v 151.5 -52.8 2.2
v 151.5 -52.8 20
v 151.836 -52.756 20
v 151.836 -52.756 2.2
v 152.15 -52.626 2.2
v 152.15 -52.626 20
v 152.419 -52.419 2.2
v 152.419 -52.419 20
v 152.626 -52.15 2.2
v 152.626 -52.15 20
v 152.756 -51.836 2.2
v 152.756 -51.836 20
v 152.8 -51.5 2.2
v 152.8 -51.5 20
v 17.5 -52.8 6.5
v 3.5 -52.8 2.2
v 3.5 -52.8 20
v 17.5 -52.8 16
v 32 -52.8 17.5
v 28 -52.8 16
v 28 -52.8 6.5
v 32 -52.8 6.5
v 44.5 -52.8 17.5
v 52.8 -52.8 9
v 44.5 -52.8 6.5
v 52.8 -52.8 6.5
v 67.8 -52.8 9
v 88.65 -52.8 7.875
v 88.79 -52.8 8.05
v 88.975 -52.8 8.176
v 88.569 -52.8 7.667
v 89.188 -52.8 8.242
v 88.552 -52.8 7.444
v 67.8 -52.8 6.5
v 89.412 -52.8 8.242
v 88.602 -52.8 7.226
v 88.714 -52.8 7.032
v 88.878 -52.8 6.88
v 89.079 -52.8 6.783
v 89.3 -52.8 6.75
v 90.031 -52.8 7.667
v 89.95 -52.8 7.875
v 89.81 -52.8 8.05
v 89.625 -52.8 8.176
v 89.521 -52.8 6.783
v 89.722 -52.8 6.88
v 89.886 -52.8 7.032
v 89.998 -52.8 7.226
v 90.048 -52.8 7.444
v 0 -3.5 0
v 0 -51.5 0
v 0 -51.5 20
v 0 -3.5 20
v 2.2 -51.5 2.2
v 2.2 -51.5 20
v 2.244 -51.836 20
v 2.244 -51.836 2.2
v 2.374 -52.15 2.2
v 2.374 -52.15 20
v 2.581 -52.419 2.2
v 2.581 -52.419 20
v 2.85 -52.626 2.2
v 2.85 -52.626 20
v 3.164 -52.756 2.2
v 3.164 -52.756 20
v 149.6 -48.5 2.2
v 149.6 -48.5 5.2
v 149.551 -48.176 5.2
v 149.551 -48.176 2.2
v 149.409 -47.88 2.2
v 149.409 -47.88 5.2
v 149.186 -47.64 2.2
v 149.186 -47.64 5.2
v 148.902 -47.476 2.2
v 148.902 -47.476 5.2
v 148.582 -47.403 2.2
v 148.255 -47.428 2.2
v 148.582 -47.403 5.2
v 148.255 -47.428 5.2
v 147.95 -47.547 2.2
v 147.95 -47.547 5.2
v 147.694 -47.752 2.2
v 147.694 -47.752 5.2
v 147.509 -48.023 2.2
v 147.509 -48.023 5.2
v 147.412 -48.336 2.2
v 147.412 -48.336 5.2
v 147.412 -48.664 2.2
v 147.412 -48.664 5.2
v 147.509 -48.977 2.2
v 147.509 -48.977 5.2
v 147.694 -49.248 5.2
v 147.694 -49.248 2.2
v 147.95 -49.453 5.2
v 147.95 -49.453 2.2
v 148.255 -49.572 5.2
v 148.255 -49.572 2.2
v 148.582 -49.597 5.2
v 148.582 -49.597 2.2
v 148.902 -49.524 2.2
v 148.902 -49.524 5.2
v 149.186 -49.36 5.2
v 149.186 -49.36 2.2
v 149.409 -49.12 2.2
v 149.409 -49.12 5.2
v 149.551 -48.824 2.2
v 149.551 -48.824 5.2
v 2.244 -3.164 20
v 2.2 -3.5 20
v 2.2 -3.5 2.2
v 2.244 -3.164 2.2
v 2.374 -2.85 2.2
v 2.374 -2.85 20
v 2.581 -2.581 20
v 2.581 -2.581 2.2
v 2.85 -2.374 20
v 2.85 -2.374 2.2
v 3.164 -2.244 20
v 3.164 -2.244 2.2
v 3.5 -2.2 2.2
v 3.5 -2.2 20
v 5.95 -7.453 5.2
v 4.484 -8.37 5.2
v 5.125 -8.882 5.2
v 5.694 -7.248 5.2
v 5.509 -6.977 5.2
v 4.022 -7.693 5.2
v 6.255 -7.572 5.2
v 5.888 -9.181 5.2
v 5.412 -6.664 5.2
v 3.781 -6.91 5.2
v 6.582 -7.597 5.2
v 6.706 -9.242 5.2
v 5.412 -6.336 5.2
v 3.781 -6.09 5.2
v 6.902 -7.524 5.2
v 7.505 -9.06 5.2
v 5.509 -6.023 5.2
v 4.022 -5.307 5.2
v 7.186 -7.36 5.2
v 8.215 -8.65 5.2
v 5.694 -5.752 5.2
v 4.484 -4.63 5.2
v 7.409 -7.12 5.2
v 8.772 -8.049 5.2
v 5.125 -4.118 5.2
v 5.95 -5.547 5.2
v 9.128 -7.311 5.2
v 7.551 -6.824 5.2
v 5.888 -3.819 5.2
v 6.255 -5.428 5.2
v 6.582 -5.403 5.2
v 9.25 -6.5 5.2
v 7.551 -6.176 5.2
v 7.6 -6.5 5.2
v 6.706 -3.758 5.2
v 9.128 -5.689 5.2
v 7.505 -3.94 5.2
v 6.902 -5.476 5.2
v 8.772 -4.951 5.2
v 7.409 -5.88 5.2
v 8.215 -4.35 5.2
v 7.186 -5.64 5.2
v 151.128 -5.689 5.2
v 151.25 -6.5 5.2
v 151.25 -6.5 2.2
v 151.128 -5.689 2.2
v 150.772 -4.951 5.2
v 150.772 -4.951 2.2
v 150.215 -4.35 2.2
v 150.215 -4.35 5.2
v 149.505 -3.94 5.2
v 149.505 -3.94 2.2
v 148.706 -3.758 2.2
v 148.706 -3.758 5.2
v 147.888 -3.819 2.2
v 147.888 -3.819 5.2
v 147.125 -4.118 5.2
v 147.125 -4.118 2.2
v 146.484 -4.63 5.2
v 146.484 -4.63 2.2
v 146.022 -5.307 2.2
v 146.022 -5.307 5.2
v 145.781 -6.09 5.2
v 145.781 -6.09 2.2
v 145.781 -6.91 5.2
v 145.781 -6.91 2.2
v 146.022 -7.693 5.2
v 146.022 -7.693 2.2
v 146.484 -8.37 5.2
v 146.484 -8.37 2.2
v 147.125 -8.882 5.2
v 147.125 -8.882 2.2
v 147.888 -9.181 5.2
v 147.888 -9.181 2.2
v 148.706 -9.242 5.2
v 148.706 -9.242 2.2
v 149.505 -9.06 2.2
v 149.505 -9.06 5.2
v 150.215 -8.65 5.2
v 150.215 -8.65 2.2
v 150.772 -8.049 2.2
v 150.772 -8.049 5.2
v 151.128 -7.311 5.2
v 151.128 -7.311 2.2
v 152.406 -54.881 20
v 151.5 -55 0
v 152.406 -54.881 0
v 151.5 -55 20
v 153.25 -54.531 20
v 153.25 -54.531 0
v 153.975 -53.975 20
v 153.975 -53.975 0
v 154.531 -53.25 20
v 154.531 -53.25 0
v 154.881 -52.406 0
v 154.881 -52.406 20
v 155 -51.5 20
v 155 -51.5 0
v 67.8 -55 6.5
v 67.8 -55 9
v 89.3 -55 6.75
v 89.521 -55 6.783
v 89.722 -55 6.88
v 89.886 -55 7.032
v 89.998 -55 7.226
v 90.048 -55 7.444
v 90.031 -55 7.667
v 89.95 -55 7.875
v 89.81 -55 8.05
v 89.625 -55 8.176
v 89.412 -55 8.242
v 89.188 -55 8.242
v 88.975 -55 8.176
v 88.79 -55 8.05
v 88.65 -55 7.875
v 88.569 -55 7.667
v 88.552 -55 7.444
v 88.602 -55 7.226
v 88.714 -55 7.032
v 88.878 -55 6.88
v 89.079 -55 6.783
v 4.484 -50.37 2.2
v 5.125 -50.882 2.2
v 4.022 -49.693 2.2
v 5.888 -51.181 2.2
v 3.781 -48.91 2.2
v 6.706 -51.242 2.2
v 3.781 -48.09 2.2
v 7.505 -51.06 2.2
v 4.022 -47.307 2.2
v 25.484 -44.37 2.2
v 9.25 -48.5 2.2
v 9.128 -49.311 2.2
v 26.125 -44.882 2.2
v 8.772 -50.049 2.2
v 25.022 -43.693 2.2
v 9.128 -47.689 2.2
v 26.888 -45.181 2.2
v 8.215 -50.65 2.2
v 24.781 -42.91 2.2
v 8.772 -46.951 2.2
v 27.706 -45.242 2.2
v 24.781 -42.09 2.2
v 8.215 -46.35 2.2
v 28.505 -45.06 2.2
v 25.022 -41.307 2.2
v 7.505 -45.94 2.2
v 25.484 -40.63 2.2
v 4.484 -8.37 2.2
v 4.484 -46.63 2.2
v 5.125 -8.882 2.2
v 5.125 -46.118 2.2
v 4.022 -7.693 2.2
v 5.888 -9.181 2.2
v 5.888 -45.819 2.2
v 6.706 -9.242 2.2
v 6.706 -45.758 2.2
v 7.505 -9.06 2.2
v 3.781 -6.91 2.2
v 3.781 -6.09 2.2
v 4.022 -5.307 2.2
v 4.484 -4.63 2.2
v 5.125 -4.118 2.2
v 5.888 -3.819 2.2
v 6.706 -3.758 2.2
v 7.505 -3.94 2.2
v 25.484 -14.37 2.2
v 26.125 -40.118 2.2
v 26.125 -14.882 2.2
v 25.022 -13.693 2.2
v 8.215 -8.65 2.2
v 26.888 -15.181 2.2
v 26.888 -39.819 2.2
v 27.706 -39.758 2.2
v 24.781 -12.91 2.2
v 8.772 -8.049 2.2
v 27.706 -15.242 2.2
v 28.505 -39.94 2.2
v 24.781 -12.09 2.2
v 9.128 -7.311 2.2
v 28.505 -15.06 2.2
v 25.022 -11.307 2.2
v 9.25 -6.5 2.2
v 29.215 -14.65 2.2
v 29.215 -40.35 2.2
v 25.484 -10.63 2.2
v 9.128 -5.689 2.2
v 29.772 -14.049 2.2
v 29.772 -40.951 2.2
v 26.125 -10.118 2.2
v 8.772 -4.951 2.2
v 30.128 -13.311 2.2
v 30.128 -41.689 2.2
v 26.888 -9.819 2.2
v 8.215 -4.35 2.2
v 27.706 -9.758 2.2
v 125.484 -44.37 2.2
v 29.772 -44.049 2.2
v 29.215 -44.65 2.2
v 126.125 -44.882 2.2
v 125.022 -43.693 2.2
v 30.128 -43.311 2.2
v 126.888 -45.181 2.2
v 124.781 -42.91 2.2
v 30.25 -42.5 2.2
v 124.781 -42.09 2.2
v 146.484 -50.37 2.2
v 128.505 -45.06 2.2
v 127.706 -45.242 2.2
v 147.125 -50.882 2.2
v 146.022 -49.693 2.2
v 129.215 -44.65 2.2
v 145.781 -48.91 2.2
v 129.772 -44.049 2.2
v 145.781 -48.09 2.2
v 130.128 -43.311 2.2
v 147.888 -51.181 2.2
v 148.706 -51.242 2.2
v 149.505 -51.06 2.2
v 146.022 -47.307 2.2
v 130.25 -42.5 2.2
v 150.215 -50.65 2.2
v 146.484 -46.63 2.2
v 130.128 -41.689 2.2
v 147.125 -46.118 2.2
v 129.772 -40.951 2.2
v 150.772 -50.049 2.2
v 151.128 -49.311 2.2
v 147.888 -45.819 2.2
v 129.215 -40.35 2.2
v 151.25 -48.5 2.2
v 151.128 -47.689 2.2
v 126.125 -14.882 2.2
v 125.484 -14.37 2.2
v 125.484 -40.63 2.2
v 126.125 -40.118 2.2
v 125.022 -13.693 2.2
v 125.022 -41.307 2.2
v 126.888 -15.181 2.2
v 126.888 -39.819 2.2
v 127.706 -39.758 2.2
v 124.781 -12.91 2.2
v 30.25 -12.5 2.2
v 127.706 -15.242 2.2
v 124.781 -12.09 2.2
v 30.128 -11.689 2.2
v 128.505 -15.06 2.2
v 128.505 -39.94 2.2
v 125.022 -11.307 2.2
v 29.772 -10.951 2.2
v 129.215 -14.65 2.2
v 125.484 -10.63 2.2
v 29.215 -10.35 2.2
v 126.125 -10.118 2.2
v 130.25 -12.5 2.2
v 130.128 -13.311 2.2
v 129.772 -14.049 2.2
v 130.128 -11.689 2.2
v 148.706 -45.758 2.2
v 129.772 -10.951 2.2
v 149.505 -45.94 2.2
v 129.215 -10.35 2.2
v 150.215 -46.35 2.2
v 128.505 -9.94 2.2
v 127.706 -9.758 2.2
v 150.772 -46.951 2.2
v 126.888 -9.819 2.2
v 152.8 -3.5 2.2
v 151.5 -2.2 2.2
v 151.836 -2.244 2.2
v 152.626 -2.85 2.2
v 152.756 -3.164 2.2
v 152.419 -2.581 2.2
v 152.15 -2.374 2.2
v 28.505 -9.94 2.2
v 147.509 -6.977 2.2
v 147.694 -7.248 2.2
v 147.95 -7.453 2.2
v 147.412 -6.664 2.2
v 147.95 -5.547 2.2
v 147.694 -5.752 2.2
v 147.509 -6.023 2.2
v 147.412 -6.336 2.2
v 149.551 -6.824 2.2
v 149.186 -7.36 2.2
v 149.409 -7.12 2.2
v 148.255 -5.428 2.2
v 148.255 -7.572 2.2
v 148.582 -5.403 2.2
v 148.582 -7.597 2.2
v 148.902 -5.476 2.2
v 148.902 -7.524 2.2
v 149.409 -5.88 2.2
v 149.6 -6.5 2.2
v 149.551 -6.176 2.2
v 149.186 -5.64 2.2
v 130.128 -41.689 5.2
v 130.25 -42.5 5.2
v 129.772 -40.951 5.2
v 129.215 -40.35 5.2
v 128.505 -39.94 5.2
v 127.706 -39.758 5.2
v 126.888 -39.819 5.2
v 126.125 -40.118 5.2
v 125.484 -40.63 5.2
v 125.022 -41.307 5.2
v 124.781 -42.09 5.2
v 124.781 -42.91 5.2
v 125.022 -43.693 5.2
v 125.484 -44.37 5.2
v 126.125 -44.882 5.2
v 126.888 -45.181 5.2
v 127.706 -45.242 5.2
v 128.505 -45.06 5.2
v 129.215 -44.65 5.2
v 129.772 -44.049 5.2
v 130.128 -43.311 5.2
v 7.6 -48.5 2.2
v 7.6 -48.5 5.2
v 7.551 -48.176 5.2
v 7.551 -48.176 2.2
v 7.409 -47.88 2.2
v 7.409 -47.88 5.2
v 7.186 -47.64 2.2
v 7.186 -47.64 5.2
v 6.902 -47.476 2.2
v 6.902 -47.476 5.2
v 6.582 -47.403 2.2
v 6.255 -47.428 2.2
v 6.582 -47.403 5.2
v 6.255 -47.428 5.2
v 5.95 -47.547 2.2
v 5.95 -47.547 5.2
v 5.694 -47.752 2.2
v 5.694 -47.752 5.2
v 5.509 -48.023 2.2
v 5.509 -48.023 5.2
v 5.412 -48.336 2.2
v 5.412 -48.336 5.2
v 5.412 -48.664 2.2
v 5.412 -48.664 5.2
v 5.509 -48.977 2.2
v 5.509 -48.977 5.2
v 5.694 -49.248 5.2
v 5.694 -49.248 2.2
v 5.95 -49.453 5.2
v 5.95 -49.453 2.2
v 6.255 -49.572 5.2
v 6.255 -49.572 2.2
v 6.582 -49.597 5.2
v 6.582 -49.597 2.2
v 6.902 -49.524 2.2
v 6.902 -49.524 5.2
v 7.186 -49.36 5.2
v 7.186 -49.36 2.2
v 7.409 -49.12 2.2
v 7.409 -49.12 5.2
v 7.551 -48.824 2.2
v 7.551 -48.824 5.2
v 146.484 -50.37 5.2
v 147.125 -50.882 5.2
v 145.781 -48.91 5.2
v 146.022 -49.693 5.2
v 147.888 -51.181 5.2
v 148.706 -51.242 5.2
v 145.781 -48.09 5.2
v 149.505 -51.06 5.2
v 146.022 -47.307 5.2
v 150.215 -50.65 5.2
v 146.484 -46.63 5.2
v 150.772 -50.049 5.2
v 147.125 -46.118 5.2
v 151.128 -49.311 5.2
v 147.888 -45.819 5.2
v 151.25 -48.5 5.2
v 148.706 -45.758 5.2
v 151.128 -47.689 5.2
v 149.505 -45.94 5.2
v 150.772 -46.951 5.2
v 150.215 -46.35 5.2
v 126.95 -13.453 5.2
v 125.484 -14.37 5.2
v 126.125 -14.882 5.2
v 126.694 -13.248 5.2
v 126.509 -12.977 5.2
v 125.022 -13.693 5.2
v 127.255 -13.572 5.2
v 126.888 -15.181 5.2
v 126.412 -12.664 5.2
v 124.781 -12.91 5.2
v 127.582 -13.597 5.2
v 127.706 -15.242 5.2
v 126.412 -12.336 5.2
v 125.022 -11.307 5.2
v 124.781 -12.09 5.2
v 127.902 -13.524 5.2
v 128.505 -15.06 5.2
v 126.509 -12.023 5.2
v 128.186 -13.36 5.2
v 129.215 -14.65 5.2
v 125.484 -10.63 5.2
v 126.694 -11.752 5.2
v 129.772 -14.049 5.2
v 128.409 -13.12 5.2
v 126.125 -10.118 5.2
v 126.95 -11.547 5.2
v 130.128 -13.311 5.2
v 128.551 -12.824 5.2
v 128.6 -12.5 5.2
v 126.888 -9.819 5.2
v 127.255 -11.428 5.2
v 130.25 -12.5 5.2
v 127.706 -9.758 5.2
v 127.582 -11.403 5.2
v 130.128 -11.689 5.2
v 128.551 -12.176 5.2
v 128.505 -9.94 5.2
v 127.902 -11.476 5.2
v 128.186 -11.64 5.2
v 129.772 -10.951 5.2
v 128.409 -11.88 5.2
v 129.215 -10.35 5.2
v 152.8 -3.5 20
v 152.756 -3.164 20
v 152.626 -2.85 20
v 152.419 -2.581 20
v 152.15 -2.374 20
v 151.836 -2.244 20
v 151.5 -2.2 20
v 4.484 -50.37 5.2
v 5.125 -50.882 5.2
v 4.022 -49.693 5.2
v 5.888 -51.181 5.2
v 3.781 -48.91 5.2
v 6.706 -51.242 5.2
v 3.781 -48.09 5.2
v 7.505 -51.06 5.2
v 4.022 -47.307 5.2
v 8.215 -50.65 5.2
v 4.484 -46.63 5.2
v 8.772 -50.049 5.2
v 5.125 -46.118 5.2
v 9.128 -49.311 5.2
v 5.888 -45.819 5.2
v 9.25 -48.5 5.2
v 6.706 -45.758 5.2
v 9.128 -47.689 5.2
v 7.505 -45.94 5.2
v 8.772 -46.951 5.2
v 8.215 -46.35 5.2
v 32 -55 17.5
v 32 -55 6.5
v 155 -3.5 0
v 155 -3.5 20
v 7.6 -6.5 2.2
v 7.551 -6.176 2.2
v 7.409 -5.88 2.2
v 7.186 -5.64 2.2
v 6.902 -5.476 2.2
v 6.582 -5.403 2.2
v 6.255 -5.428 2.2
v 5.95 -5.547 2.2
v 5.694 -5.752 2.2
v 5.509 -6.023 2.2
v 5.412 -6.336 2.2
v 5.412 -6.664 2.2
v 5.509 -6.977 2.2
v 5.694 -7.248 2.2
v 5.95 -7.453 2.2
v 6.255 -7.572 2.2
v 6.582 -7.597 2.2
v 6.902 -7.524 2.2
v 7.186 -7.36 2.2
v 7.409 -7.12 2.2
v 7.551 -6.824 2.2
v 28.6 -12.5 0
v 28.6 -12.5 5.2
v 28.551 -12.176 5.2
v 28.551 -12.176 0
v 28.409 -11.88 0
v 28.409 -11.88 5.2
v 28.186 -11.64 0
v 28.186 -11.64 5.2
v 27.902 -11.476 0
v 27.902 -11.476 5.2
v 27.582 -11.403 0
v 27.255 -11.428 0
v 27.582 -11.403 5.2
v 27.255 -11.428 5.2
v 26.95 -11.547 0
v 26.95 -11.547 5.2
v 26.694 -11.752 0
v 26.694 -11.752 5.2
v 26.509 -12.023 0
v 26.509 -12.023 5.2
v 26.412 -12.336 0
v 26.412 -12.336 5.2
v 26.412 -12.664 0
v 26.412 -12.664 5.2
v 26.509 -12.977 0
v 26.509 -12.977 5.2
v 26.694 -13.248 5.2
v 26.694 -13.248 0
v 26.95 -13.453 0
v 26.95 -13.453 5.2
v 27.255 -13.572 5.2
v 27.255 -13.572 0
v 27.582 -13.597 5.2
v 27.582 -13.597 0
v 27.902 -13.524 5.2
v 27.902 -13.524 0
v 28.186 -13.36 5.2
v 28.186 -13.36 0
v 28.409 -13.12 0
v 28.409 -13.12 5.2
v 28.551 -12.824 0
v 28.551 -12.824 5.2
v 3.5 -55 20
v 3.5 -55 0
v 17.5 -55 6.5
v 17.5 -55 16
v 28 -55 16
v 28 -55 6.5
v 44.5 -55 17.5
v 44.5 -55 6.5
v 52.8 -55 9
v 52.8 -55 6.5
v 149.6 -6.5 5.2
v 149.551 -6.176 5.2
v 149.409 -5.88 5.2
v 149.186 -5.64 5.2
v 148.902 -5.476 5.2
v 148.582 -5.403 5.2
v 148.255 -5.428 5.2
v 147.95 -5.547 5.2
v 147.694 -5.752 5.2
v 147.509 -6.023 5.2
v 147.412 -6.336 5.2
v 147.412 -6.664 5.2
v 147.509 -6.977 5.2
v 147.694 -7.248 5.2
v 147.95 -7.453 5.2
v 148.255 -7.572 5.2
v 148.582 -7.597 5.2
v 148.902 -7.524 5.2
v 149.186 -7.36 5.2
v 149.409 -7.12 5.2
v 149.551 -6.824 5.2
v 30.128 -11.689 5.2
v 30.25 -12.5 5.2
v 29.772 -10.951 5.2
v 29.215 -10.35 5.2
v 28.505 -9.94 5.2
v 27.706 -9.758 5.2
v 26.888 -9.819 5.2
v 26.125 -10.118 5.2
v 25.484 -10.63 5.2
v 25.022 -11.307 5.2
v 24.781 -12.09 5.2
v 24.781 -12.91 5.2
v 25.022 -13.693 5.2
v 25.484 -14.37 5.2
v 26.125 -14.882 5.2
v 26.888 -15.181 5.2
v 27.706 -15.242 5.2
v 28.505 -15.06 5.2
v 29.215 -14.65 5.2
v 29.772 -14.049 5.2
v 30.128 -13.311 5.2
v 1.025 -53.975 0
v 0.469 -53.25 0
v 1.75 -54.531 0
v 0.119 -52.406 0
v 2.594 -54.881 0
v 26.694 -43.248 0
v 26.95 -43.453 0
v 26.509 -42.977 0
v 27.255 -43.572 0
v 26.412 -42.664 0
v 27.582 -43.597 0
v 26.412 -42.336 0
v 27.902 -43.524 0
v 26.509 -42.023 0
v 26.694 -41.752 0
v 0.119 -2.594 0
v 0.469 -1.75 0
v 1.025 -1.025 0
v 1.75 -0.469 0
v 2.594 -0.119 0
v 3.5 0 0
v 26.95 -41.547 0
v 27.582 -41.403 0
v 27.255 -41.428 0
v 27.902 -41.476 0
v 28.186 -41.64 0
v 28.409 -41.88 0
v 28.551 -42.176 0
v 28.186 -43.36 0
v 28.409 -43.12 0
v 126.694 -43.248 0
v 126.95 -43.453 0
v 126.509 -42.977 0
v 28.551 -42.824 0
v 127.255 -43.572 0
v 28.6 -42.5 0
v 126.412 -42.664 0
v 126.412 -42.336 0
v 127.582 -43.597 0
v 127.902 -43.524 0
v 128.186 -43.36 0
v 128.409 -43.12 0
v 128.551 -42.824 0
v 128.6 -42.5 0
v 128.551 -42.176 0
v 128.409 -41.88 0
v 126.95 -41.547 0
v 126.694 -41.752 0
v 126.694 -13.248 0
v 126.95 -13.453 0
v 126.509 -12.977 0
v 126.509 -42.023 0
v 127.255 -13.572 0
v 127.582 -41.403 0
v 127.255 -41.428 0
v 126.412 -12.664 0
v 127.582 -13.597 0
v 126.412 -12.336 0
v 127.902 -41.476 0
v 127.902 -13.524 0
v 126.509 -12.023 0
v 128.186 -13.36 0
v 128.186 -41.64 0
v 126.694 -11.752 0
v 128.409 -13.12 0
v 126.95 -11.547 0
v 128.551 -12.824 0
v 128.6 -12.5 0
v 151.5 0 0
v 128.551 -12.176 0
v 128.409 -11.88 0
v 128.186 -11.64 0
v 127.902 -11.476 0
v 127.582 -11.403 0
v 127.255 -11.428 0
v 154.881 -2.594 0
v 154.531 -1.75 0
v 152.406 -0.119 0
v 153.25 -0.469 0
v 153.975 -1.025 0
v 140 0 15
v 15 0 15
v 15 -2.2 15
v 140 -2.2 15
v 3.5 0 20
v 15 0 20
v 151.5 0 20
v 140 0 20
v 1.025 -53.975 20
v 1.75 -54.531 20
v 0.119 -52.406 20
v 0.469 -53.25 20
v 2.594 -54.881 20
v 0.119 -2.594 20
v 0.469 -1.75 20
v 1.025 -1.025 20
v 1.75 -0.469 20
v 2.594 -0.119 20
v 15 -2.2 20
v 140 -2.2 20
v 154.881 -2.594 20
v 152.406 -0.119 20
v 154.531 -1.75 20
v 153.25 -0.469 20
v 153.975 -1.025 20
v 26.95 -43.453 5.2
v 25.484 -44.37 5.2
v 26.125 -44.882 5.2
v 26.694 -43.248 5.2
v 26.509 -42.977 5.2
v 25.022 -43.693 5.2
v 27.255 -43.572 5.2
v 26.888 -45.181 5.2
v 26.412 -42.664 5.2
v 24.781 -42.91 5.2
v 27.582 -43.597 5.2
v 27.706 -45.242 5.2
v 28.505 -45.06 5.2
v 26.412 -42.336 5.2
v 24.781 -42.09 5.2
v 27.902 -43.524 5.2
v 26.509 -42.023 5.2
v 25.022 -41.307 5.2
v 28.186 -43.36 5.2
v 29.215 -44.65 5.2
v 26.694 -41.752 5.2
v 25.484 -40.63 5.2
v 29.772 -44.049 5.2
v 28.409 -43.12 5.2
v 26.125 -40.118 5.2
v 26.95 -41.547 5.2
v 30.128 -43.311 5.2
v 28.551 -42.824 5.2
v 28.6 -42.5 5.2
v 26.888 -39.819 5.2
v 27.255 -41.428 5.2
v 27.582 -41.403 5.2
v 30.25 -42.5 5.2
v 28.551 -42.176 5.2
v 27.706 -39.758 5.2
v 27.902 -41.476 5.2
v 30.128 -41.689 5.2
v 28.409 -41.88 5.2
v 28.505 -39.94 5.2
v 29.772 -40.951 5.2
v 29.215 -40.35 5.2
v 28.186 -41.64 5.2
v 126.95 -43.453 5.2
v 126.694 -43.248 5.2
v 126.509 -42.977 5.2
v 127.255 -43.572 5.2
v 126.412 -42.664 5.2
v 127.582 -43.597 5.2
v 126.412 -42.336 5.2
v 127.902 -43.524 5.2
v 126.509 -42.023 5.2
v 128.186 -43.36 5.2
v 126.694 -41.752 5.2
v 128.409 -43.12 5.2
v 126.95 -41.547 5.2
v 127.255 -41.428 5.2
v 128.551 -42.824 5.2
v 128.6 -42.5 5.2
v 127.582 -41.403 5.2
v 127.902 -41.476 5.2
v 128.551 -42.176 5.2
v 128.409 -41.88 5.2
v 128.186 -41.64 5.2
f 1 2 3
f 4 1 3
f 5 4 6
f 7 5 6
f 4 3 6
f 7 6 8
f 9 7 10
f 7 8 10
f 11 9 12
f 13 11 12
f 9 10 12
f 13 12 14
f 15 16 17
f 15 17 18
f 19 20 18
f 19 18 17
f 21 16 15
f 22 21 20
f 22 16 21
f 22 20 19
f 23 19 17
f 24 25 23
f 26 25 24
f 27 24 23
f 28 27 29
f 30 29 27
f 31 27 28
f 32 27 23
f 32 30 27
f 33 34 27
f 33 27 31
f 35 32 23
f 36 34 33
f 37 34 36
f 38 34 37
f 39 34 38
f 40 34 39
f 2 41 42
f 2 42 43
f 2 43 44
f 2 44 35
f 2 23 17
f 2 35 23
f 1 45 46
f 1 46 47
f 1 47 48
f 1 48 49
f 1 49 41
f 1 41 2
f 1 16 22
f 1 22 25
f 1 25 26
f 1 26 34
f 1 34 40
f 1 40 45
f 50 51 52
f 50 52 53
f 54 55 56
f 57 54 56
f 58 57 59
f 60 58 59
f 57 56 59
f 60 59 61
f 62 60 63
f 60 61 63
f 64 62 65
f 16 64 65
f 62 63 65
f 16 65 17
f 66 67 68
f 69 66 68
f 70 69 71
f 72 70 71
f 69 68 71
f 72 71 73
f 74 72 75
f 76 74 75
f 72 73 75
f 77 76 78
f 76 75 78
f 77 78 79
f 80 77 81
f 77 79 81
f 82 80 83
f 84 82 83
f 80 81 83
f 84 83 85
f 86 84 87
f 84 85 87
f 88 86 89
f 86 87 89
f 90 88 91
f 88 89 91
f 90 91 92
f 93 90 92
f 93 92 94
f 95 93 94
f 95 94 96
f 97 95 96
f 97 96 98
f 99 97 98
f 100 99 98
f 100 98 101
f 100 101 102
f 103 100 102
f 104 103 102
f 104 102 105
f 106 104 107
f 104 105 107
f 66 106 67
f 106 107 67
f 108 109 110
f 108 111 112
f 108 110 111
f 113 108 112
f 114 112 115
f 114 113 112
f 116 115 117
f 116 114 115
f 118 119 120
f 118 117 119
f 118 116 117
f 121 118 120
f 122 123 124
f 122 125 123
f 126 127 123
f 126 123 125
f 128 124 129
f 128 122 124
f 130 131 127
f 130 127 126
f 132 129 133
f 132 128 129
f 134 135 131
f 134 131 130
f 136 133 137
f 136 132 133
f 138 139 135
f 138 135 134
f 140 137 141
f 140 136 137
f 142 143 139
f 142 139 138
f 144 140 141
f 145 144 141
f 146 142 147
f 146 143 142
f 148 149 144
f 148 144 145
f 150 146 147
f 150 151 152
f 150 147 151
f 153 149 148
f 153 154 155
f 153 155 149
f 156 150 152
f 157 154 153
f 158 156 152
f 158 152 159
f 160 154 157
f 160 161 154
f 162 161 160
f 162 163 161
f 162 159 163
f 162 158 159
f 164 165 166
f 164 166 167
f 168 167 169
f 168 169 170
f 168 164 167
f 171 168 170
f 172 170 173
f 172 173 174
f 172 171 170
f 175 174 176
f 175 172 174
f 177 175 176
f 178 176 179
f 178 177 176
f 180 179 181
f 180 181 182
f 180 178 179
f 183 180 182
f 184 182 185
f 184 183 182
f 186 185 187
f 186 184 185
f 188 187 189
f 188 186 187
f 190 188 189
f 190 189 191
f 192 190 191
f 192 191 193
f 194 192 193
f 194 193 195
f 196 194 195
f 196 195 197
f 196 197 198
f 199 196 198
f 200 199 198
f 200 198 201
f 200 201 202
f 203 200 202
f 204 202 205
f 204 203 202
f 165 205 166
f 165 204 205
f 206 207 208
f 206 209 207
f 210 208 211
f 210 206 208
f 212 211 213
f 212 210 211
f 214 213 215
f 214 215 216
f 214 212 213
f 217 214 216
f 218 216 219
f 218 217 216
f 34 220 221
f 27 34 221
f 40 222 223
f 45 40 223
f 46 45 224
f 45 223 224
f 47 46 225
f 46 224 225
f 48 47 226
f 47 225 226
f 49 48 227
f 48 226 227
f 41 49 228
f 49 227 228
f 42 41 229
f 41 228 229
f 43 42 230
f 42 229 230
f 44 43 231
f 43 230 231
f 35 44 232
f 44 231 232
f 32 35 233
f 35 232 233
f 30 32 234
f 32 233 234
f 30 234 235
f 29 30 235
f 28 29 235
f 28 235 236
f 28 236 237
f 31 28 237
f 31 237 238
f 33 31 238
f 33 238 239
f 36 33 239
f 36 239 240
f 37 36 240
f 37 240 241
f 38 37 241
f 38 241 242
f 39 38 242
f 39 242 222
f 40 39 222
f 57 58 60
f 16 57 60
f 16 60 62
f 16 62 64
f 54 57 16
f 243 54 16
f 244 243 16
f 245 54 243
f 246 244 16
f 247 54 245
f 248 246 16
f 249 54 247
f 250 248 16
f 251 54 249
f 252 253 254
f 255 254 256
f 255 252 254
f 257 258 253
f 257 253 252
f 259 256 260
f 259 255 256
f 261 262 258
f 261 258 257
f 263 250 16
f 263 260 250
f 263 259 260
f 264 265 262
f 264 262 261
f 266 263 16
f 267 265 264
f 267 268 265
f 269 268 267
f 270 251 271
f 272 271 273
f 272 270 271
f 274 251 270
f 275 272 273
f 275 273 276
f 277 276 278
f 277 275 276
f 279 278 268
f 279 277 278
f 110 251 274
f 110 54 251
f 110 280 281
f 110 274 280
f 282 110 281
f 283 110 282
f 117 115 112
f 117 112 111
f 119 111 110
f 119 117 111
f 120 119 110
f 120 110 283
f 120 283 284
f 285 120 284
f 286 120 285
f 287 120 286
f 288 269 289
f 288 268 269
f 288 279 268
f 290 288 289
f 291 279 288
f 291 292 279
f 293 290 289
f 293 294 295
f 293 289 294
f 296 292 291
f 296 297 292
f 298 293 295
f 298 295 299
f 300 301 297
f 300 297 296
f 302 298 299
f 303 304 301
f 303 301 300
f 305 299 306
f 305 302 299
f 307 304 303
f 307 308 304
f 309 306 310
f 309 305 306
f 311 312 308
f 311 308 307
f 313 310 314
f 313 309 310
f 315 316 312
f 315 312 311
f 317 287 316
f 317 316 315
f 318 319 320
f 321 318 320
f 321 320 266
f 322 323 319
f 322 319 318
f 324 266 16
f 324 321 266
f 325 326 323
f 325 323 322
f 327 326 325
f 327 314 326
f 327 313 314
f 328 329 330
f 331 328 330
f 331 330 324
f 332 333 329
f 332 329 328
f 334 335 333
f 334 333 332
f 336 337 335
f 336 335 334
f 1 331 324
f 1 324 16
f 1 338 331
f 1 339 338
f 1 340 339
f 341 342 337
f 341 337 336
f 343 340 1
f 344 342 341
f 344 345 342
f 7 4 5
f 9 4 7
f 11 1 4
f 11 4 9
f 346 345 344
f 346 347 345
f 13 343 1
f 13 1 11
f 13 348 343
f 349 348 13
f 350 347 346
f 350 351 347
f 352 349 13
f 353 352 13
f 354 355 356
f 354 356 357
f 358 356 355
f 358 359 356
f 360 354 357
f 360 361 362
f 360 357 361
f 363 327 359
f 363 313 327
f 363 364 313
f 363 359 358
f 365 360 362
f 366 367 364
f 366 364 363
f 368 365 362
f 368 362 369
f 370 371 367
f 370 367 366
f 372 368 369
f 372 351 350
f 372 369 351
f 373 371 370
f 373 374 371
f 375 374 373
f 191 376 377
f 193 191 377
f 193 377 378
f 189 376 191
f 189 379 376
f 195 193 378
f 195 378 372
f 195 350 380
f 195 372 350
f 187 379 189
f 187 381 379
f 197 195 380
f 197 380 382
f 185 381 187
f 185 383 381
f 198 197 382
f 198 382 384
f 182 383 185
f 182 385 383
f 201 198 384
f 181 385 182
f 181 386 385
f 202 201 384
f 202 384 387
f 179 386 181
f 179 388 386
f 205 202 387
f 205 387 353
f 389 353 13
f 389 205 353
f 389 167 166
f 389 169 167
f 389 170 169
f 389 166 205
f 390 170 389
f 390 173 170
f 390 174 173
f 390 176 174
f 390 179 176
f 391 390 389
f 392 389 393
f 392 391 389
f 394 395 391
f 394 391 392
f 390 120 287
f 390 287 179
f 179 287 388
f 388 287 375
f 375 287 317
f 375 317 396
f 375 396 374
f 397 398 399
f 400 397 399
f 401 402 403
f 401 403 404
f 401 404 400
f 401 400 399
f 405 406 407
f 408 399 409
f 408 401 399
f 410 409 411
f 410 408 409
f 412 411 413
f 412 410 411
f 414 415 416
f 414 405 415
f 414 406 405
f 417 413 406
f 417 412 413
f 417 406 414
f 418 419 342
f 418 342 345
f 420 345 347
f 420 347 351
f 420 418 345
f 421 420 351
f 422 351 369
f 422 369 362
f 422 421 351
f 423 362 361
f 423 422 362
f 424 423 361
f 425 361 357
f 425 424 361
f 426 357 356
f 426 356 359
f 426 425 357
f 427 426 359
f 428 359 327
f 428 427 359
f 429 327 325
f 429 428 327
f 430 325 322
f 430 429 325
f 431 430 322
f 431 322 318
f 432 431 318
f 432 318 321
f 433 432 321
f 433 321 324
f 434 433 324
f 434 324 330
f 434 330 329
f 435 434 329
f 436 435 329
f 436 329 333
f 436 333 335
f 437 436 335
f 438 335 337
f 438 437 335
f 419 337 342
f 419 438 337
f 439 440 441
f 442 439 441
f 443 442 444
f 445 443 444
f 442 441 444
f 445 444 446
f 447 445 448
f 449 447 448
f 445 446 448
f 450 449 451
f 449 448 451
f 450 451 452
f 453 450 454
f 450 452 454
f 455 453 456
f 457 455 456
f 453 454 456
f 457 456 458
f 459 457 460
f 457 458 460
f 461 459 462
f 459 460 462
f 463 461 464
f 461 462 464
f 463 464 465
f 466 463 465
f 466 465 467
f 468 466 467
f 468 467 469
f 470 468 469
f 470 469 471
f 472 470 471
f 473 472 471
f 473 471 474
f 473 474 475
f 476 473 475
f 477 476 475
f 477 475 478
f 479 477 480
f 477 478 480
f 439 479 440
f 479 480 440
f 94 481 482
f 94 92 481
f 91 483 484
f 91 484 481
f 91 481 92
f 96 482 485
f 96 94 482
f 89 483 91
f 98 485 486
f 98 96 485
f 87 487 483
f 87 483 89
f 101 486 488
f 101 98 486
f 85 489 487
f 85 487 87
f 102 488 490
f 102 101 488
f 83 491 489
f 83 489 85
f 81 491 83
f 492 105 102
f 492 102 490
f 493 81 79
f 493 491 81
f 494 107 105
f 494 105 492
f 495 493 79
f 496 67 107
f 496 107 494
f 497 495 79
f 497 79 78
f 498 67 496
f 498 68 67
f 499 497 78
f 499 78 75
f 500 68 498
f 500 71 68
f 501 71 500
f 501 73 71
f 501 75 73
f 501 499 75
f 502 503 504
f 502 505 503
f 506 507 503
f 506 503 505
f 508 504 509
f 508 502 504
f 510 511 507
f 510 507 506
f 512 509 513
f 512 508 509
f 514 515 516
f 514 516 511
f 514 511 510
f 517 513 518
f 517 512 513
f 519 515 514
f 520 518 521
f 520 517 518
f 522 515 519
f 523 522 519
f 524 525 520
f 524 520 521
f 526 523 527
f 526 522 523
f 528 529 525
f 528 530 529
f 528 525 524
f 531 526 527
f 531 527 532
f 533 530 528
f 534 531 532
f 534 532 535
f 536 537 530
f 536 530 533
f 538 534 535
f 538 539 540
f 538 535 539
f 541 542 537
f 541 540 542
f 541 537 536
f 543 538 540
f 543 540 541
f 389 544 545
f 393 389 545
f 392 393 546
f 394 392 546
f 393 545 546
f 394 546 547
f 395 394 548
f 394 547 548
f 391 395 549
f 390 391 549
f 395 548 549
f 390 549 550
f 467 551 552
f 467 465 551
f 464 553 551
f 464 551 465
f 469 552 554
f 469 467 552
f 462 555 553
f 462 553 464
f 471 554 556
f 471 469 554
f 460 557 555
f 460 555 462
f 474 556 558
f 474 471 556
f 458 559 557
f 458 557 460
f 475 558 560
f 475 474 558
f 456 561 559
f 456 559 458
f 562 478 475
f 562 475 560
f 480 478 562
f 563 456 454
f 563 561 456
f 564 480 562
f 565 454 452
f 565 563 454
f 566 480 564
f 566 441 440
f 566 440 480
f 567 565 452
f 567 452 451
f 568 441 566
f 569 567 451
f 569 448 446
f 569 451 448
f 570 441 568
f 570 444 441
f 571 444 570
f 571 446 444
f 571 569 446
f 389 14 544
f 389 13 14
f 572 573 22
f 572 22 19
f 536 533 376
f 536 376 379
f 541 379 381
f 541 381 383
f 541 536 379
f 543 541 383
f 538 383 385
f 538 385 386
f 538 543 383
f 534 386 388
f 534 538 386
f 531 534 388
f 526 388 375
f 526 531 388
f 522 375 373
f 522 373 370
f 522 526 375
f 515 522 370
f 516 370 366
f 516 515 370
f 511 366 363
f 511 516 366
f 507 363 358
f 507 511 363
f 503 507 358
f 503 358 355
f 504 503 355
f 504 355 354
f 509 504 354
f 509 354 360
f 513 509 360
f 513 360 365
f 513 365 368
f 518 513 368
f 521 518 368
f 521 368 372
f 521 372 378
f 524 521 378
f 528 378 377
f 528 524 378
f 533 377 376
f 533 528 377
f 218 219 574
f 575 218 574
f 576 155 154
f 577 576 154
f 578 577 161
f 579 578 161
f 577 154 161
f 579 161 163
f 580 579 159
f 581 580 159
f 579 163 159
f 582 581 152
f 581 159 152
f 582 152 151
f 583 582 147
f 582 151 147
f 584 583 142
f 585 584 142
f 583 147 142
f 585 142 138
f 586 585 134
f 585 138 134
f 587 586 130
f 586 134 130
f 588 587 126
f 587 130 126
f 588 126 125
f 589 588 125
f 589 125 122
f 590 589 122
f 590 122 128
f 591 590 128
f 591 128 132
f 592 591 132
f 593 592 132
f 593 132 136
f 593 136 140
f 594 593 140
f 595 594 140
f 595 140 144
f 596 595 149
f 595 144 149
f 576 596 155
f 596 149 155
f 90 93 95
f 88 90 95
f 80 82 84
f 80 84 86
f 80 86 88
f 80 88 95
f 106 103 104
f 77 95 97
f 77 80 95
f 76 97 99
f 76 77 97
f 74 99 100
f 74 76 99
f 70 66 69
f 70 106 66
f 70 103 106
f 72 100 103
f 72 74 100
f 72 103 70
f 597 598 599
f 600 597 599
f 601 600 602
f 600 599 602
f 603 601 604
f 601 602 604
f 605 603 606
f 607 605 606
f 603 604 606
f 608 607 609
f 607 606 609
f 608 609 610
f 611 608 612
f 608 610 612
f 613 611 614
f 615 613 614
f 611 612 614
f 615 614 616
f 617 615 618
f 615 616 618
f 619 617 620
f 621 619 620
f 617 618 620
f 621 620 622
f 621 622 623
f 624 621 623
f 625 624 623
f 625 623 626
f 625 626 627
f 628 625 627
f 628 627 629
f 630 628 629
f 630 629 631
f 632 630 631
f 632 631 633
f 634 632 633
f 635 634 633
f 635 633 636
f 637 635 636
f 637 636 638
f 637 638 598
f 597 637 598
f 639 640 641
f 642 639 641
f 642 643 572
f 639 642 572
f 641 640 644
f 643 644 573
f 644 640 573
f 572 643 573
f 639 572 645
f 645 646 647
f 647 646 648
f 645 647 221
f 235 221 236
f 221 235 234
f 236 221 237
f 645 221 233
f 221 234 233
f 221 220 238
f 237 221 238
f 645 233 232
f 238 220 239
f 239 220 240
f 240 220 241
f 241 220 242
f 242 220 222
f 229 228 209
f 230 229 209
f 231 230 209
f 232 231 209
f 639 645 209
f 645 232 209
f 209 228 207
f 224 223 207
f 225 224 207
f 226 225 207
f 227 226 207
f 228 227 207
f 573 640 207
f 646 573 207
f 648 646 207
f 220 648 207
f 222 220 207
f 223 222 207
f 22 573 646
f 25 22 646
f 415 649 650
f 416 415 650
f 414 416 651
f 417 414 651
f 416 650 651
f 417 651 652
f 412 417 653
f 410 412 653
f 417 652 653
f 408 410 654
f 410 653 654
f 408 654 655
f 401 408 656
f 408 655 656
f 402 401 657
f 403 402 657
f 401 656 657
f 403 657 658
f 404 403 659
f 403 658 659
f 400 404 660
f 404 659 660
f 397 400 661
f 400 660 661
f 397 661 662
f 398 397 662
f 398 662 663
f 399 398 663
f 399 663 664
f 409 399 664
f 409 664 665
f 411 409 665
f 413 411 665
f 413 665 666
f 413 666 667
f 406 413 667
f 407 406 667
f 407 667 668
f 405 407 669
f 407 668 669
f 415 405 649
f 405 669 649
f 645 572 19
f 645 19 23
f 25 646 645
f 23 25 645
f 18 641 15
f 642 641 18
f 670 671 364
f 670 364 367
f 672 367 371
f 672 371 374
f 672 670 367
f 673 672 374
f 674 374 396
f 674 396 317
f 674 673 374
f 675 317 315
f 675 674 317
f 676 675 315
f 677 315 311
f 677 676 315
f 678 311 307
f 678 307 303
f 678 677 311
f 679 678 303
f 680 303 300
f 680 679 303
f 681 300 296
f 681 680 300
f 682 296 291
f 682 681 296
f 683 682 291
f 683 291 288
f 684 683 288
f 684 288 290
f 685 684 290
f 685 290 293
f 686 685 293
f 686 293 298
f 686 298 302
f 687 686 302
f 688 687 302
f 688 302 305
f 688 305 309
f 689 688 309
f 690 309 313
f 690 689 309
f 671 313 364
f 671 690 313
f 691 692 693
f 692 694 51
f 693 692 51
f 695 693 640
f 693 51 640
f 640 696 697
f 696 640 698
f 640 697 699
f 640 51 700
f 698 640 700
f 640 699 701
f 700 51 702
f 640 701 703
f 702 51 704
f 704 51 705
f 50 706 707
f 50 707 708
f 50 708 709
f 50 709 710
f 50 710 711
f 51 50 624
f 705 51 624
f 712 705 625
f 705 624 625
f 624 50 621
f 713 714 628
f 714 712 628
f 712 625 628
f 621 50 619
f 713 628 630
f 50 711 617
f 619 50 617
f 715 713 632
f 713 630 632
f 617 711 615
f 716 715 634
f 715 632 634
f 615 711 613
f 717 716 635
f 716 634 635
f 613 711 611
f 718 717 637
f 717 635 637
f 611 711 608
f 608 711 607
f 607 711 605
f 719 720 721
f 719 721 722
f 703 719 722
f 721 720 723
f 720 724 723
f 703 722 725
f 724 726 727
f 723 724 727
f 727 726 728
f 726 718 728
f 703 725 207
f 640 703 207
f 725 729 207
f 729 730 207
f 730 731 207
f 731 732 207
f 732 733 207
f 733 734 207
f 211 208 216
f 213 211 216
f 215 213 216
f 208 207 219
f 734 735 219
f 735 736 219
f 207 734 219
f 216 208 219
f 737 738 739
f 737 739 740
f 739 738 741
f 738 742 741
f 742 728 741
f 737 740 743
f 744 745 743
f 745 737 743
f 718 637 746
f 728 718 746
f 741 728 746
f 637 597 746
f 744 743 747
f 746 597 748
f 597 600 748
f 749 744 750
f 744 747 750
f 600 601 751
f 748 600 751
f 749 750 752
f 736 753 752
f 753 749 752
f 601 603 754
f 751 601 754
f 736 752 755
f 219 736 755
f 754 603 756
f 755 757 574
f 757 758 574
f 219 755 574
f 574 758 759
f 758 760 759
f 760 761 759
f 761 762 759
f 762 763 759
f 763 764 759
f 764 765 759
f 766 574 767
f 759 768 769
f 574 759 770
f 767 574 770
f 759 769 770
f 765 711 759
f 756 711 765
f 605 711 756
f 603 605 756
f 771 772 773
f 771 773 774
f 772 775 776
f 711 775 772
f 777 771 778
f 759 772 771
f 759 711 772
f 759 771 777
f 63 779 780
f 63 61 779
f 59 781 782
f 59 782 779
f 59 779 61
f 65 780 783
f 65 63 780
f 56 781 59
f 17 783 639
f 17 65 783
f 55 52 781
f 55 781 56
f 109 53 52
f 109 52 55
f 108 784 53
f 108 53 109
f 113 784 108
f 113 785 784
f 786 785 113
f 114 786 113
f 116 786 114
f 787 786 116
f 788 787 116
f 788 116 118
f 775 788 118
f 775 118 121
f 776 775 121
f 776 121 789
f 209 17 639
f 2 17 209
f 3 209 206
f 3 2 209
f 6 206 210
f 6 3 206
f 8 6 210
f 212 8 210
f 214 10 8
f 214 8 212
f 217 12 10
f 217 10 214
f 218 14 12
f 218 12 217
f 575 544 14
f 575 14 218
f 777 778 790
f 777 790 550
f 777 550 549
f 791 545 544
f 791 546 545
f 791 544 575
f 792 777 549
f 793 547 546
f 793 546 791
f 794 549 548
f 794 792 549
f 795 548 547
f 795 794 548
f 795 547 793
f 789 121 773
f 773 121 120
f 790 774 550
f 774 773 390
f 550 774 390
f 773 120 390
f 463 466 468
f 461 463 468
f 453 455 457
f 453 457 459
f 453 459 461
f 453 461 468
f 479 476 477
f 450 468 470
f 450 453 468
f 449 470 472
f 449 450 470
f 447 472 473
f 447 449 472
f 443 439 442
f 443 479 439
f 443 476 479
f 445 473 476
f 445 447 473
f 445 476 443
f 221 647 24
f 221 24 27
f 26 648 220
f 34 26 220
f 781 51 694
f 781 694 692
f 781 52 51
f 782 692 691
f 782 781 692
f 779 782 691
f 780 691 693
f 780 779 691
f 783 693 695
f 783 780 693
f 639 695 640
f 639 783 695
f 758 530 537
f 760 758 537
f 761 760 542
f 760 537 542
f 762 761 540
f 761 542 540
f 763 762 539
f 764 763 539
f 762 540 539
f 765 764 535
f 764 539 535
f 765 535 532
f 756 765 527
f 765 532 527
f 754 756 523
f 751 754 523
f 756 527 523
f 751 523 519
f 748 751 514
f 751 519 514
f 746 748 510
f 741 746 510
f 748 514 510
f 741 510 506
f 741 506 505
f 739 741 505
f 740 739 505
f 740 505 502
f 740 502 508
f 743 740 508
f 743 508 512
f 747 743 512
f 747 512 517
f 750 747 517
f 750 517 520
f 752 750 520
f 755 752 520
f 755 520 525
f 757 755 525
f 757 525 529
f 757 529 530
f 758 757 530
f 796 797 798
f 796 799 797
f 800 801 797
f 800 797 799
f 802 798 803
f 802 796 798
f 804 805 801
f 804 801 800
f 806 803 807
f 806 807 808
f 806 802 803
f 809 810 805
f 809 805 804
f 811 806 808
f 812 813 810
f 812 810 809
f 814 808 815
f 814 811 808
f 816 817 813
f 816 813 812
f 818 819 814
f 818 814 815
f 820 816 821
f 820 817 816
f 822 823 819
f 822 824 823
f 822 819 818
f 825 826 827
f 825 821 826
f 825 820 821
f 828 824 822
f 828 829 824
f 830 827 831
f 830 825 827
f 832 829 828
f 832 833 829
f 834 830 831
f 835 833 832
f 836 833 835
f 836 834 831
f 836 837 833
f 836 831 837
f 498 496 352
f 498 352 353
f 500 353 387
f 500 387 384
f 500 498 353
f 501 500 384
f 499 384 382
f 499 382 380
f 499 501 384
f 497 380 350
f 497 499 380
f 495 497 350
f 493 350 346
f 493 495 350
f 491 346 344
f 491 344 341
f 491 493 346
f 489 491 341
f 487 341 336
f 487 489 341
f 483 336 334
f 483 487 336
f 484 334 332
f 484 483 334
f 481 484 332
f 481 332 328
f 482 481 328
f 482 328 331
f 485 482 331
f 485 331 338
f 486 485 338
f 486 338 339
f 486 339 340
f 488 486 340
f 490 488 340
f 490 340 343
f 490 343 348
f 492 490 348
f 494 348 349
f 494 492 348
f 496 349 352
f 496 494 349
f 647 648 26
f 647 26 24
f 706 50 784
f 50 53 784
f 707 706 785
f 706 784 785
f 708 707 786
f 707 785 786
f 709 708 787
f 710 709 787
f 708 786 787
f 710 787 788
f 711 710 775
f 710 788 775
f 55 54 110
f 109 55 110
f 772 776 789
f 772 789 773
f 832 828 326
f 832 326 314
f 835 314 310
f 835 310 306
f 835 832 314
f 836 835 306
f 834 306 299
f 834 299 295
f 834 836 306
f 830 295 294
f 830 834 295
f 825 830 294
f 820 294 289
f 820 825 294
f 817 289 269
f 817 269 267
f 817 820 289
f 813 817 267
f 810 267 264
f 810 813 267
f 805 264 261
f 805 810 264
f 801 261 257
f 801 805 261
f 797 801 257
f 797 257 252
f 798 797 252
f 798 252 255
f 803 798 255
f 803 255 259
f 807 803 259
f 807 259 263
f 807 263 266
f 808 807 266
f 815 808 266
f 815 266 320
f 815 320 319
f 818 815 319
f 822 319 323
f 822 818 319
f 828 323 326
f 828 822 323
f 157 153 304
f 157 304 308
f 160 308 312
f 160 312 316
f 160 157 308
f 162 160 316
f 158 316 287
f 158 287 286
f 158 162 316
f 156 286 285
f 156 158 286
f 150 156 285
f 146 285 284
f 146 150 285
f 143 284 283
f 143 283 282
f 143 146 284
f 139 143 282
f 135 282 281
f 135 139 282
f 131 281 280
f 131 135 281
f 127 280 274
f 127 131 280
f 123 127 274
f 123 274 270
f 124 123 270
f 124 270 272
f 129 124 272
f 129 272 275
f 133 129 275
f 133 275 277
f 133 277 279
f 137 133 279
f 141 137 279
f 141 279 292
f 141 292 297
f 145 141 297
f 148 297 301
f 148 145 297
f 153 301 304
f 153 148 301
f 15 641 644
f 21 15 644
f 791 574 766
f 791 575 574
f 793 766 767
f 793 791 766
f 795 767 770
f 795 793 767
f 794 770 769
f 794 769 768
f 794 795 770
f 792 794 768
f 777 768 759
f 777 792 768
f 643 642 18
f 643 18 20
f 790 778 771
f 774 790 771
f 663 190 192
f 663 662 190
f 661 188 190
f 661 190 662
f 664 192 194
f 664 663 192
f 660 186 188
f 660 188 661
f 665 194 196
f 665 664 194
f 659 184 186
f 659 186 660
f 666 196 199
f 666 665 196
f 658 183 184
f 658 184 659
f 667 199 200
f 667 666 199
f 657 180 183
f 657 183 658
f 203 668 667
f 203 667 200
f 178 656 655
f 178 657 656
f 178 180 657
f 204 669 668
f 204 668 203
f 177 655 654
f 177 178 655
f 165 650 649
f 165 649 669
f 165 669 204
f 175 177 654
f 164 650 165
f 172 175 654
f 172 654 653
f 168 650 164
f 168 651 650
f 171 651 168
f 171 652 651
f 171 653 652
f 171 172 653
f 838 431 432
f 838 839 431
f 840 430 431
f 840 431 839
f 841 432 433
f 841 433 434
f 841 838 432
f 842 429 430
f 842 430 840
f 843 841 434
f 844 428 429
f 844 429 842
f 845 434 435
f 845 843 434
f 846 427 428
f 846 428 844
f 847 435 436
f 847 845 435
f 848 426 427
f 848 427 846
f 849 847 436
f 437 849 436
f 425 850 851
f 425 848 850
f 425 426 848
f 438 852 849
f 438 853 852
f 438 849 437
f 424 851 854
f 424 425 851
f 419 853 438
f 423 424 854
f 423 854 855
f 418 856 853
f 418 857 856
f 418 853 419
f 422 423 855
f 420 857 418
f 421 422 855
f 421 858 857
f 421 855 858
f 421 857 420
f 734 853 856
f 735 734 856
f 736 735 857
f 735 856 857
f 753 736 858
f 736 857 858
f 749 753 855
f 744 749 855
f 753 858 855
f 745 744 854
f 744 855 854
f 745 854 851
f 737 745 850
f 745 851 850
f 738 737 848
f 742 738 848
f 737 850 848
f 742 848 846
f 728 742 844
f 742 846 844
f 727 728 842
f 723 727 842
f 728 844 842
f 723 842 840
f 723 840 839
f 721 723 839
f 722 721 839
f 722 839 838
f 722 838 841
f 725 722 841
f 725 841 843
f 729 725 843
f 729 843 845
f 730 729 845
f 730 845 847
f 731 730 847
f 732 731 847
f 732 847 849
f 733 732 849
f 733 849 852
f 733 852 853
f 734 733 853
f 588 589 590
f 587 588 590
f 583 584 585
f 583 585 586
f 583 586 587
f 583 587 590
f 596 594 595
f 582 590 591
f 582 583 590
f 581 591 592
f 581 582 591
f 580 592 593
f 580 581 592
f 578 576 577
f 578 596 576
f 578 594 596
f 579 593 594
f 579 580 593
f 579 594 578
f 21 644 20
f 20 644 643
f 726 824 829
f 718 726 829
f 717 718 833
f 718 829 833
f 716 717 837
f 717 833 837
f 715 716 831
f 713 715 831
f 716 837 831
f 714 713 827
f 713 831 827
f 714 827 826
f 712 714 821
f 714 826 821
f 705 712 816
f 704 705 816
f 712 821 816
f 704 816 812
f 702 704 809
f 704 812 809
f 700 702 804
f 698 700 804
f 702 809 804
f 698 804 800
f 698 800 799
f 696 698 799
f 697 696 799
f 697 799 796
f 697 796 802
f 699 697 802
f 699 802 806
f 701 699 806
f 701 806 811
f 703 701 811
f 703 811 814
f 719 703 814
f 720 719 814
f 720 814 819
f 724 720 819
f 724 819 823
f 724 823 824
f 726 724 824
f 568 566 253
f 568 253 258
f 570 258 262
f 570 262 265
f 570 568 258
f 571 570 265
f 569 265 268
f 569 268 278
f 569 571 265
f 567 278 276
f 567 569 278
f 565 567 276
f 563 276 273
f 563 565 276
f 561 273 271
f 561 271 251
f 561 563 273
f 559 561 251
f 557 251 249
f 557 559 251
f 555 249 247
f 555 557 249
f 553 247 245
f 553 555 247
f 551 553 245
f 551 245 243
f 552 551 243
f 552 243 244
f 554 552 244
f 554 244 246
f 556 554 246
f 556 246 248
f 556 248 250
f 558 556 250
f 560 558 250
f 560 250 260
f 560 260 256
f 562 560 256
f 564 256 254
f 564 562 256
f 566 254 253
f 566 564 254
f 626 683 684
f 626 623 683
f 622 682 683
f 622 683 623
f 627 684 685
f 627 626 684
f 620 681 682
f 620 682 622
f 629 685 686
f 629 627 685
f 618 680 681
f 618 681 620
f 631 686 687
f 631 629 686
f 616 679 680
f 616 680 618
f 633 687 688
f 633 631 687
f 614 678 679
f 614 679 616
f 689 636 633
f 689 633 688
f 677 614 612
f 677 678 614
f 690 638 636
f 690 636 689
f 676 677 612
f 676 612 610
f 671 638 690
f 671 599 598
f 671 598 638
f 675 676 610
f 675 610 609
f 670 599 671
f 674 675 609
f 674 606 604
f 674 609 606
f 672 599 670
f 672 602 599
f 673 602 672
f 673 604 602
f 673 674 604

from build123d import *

# Parameters (mm, degrees)
SKETCH_1_W          = 155
SKETCH_1_H          = 55
EXTRUDE_1_DEPTH     = 20
FILLET_1_R          = 3.5
SHELL_1_T           = -2.2
SKETCH_2_R          = 1.1
CUT_EXTRUDE_1_DEPTH = 10
EXTRUDE_START       = 3
SKETCH_3_R          = 2.75
SKETCH_3_R_2        = 1.1
EXTRUDE_2_DEPTH     = 3
SKETCH_4_R          = 0.75
SKETCH_4_W          = 10.5
SKETCH_4_H          = 9.5
SKETCH_4_W_2        = 12.5
SKETCH_4_H_2        = 11
SKETCH_4_W_3        = 15
SKETCH_4_H_3        = 2.5
CUT_EXTRUDE_2_DEPTH = 3
SKETCH_5_W          = 125
SKETCH_5_H          = 5
CUT_EXTRUDE_3_DEPTH = 3


with BuildPart() as part:
    # 草图1 → 凸台-拉伸1 (new body)
    with BuildSketch(Plane.XY):
        with Locations((77.5, -27.5)):
            Rectangle(SKETCH_1_W, SKETCH_1_H)
    extrude(amount=EXTRUDE_1_DEPTH)

    # 圆角1
    fillet_1_edges = [part.edges().sort_by_distance(p)[0] for p in [
        (0, 0, 10),
        (155, 0, 10),
        (155, -55, 10),
        (0, -55, 10),
    ]]
    fillet(fillet_1_edges, radius=FILLET_1_R)

    # 抽壳1
    shell_1_openings = [part.faces().sort_by_distance(p)[0] for p in [
        (77.5, -27.5, 20),
    ]]
    offset(amount=SHELL_1_T, openings=shell_1_openings, kind=Kind.INTERSECTION)

    # 草图2 → 切除-拉伸1 (cut)
    with BuildSketch(Plane.XY.offset(2.2)):
        with Locations((27.5, -12.5)):
            Circle(SKETCH_2_R)
        with Locations((127.5, -12.5)):
            Circle(SKETCH_2_R)
        with Locations((127.5, -42.5)):
            Circle(SKETCH_2_R)
        with Locations((27.5, -42.5)):
            Circle(SKETCH_2_R)
    extrude(amount=-CUT_EXTRUDE_1_DEPTH, mode=Mode.SUBTRACT)

    # 草图3 → 凸台-拉伸2 (add)
    # profile 1 of 8: a face of its own
    with BuildSketch(Plane.XY.offset(2.2).offset(EXTRUDE_START)):
        with Locations((27.5, -12.5)):
            Circle(SKETCH_3_R)
        with Locations((27.5, -12.5)):
            Circle(SKETCH_3_R_2, mode=Mode.SUBTRACT)
    # profile 2 of 8: a face of its own
    with BuildSketch(Plane.XY.offset(2.2).offset(EXTRUDE_START)):
        with Locations((127.5, -12.5)):
            Circle(SKETCH_3_R)
        with Locations((127.5, -12.5)):
            Circle(SKETCH_3_R_2, mode=Mode.SUBTRACT)
    # profile 3 of 8: a face of its own
    with BuildSketch(Plane.XY.offset(2.2).offset(EXTRUDE_START)):
        with Locations((127.5, -42.5)):
            Circle(SKETCH_3_R)
        with Locations((127.5, -42.5)):
            Circle(SKETCH_3_R_2, mode=Mode.SUBTRACT)
    # profile 4 of 8: a face of its own
    with BuildSketch(Plane.XY.offset(2.2).offset(EXTRUDE_START)):
        with Locations((27.5, -42.5)):
            Circle(SKETCH_3_R)
        with Locations((27.5, -42.5)):
            Circle(SKETCH_3_R_2, mode=Mode.SUBTRACT)
    # profile 5 of 8: a face of its own
    with BuildSketch(Plane.XY.offset(2.2).offset(EXTRUDE_START)):
        with Locations((6.5, -6.5)):
            Circle(SKETCH_3_R)
        with Locations((6.5, -6.5)):
            Circle(SKETCH_3_R_2, mode=Mode.SUBTRACT)
    # profile 6 of 8: a face of its own
    with BuildSketch(Plane.XY.offset(2.2).offset(EXTRUDE_START)):
        with Locations((148.5, -6.5)):
            Circle(SKETCH_3_R)
        with Locations((148.5, -6.5)):
            Circle(SKETCH_3_R_2, mode=Mode.SUBTRACT)
    # profile 7 of 8: a face of its own
    with BuildSketch(Plane.XY.offset(2.2).offset(EXTRUDE_START)):
        with Locations((148.5, -48.5)):
            Circle(SKETCH_3_R)
        with Locations((148.5, -48.5)):
            Circle(SKETCH_3_R_2, mode=Mode.SUBTRACT)
    # profile 8 of 8: a face of its own
    with BuildSketch(Plane.XY.offset(2.2).offset(EXTRUDE_START)):
        with Locations((6.5, -48.5)):
            Circle(SKETCH_3_R)
        with Locations((6.5, -48.5)):
            Circle(SKETCH_3_R_2, mode=Mode.SUBTRACT)
    extrude(amount=-EXTRUDE_2_DEPTH)

    # 草图4 → 切除-拉伸2 (cut)
    with BuildSketch(Plane.XZ.offset(55)):
        with Locations(Location((89.3, 7.5, 0), (0, 0, 270))):
            Circle(SKETCH_4_R)
        with Locations((22.75, 11.25)):
            Rectangle(SKETCH_4_W, SKETCH_4_H)
        with Locations((38.25, 12)):
            Rectangle(SKETCH_4_W_2, SKETCH_4_H_2)
        with Locations((60.3, 7.75)):
            Rectangle(SKETCH_4_W_3, SKETCH_4_H_3)
    extrude(amount=-CUT_EXTRUDE_2_DEPTH, mode=Mode.SUBTRACT)

    # 草图5 → 切除-拉伸3 (cut)
    with BuildSketch(Plane(origin=(0, 0, 0), x_dir=(1, 0, 0), z_dir=(0, 1, 0))):
        with Locations((77.5, -17.5)):
            Rectangle(SKETCH_5_W, SKETCH_5_H)
    extrude(amount=-CUT_EXTRUDE_3_DEPTH, mode=Mode.SUBTRACT)


solid = part.part
